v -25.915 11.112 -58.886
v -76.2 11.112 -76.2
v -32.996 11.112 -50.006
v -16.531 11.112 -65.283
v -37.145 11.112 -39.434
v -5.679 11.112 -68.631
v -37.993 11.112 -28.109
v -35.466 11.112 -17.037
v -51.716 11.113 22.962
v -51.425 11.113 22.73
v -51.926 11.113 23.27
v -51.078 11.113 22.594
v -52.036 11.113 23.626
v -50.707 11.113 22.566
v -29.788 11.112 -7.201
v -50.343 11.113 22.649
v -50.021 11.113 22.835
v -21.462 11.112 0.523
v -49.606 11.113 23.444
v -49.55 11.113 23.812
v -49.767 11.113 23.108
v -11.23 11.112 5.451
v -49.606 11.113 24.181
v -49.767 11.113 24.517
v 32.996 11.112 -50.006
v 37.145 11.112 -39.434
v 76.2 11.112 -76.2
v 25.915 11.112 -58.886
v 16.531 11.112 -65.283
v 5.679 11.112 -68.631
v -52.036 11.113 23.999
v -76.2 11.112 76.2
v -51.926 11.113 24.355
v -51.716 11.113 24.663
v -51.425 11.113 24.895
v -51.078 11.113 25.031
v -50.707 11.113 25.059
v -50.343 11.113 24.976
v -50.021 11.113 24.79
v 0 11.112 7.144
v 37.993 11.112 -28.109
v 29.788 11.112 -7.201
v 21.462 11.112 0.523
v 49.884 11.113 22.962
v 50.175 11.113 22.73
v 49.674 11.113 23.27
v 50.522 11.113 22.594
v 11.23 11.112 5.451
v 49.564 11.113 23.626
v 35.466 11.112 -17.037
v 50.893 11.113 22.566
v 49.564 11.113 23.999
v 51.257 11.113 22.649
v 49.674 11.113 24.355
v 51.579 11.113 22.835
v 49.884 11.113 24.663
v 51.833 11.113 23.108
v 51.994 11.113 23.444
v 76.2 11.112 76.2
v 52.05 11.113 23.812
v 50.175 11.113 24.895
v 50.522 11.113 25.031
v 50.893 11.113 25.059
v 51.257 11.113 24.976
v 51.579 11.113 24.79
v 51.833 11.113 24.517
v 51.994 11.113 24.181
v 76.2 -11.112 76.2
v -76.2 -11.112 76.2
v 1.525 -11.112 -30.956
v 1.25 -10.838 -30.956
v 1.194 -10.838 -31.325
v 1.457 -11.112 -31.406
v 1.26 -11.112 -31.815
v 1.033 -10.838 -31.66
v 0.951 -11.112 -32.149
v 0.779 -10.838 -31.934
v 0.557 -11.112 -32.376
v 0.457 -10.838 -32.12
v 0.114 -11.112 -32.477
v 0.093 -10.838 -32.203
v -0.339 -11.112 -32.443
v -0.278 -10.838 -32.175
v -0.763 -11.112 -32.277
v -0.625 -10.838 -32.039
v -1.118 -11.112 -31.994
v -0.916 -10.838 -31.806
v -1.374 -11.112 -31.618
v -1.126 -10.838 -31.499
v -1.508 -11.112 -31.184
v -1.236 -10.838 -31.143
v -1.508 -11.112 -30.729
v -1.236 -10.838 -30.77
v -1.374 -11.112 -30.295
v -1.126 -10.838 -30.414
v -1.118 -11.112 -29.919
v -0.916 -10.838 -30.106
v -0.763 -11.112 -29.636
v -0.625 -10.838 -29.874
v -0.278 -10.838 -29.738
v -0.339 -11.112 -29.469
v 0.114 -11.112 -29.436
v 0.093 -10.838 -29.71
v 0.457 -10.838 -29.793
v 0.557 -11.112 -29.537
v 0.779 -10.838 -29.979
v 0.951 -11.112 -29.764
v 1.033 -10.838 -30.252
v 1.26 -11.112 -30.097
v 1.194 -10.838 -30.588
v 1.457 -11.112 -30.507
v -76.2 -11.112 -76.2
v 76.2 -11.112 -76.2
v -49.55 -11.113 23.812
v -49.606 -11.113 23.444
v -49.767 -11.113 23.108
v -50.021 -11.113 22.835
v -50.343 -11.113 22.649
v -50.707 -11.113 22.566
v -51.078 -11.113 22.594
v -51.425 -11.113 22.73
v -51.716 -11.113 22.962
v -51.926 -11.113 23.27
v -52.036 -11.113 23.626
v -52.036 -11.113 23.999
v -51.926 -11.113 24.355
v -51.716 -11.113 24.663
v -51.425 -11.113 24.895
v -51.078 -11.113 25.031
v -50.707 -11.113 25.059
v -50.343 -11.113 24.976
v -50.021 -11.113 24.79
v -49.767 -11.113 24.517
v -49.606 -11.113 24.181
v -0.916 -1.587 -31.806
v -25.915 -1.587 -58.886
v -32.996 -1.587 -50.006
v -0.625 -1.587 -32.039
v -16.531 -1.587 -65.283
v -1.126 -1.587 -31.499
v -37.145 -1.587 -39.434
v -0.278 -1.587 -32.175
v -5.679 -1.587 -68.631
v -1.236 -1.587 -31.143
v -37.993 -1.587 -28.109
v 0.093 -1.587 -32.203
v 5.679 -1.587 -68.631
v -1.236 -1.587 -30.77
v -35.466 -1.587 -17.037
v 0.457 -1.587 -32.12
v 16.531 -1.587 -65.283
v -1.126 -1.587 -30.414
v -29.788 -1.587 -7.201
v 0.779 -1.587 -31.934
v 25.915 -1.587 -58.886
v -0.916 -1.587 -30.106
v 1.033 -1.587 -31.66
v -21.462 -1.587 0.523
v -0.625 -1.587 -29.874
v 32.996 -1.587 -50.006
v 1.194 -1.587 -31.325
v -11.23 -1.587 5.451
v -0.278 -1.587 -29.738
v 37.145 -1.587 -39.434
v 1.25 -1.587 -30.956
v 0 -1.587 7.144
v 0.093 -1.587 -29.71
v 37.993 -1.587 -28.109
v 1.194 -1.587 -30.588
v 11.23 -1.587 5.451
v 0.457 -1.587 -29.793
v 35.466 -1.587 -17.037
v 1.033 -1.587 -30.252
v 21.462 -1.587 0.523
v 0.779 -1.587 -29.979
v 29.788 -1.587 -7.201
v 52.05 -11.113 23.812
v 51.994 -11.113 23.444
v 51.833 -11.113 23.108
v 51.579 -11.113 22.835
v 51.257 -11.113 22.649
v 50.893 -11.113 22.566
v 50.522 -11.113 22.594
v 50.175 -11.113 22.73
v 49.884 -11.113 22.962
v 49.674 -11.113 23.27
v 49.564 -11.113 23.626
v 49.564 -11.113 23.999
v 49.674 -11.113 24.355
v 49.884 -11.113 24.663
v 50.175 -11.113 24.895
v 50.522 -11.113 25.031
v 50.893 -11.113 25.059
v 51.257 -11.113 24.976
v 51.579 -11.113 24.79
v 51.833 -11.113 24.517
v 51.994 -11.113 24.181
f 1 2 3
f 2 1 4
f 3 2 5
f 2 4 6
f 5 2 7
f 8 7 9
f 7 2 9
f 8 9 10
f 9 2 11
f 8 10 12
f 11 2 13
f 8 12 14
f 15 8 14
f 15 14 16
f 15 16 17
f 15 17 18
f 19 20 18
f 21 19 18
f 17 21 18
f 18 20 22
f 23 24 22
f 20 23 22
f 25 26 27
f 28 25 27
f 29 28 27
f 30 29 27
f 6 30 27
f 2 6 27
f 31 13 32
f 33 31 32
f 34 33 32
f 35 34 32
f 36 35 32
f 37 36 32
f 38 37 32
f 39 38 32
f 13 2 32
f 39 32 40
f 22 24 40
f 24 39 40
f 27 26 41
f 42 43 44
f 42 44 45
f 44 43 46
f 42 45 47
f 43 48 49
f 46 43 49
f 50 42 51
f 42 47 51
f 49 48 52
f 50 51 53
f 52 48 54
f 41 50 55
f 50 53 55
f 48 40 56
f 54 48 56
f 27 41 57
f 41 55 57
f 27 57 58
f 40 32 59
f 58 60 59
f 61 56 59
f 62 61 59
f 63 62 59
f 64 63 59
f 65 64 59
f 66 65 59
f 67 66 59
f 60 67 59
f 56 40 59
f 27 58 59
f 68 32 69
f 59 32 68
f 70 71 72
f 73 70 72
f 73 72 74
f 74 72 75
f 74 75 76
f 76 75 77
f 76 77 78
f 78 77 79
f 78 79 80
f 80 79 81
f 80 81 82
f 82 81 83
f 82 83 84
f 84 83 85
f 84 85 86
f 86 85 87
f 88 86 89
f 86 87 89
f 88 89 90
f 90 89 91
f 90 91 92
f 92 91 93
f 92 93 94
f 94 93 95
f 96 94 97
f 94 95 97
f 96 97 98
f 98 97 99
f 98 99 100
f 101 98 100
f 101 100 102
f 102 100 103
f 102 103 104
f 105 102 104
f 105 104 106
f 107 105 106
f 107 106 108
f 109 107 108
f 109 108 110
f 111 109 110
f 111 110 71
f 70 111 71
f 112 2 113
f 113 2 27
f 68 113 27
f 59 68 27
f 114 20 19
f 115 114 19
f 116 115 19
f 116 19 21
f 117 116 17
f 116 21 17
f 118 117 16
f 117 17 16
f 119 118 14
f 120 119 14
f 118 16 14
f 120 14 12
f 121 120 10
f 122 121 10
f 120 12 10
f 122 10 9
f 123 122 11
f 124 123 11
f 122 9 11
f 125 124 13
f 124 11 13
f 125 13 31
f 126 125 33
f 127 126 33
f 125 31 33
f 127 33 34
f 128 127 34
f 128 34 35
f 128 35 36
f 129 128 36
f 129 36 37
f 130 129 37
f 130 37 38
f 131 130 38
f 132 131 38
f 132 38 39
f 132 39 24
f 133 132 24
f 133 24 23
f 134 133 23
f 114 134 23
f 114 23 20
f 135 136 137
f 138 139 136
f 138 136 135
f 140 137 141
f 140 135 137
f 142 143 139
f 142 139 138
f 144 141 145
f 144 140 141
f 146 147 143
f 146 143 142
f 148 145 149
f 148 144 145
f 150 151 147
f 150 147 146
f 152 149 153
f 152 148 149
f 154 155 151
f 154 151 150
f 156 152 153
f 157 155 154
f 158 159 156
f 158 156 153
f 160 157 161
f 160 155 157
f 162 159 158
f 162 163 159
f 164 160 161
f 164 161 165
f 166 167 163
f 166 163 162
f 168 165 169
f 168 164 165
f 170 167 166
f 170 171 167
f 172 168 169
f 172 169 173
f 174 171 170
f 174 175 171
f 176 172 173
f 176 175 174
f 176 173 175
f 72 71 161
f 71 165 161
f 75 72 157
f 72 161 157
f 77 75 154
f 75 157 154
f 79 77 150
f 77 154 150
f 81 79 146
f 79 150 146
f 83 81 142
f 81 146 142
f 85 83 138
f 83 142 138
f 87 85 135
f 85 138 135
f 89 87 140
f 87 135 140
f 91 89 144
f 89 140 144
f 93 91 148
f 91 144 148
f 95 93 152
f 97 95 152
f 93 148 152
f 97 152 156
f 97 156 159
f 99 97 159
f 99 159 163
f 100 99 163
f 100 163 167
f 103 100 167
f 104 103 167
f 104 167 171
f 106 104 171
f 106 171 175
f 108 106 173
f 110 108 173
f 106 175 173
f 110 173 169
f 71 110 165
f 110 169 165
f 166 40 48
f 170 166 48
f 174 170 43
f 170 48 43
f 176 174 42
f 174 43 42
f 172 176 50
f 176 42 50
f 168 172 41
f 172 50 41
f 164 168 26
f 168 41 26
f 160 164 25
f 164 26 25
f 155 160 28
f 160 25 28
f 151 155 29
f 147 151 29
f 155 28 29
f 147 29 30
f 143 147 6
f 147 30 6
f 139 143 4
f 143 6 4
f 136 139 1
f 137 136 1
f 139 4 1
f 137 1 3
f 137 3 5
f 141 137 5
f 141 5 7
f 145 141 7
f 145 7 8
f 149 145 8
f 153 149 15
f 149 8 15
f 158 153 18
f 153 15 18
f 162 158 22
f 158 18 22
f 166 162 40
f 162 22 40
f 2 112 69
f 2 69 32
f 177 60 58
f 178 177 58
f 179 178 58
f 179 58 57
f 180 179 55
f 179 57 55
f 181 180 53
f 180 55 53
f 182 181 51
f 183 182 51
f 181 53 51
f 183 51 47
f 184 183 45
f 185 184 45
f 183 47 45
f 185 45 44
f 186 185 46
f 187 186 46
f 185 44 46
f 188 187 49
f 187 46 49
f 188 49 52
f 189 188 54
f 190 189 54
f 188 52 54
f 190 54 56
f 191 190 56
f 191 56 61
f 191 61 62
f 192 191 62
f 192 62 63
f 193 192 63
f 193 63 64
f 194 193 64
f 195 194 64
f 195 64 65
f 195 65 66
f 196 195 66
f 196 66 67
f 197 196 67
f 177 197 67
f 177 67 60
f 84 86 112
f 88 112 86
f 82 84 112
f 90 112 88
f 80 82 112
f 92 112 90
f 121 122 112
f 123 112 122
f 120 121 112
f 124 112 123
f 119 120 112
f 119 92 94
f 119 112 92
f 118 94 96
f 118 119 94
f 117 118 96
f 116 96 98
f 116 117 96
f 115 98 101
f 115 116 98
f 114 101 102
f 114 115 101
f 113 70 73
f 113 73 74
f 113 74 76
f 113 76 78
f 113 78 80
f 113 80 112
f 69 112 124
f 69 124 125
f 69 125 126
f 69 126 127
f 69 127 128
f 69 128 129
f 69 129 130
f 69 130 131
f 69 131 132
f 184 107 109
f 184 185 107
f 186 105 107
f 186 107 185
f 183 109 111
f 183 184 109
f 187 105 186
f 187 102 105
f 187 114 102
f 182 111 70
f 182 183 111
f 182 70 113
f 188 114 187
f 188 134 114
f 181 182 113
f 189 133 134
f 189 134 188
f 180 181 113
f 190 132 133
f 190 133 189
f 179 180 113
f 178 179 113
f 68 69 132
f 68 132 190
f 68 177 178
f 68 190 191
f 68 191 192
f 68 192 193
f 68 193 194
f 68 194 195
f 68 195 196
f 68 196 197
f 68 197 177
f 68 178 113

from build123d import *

# Parameters (mm, degrees)
SKETCH3_W                   = 152.4
SKETCH3_H                   = 22.225
BOSS_EXTRUDE1_DEPTH         = 76.2
M3_TAPPED_HOLE1_D           = 2.5
SKETCH10_R                  = 38.1
CUT_EXTRUDE3_DEPTH          = 12.7
M3_TAPPED_HOLE2_D           = 2.5
M3_TAPPED_HOLE2_CSINK_D     = 3.05
M3_TAPPED_HOLE2_CSINK_ANGLE = 90


with BuildPart() as part:
    # Sketch3 → Boss-Extrude1 (new, symmetric)
    with BuildSketch(Plane.XY):
        Rectangle(SKETCH3_W, SKETCH3_H)
    extrude(amount=BOSS_EXTRUDE1_DEPTH, both=True)

    # M3 Tapped Hole1 (through all)
    with Locations(Plane(origin=(0, -11.1125, 0), x_dir=(-1, 0, 0), z_dir=(0, -1, 0))):
        with Locations((-50.8, -23.8125), (50.8, -23.8125)):
            Hole(M3_TAPPED_HOLE1_D / 2)

    # Sketch10 → Cut-Extrude3 (cut)
    with BuildSketch(Plane(origin=(0, 11.1125, 0), x_dir=(1, 0, 0), z_dir=(0, 1, 0))):
        with Locations(Location((0, 30.95625, 0), (0, 0, 270))):
            Circle(SKETCH10_R)
    extrude(amount=-CUT_EXTRUDE3_DEPTH, mode=Mode.SUBTRACT)

    # M3 Tapped Hole2 (through all)
    with Locations(Plane(origin=(0, -11.1125, 0), x_dir=(-1, 0, 0), z_dir=(0, -1, 0))):
        with Locations((0, 30.95625)):
            CounterSinkHole(M3_TAPPED_HOLE2_D / 2, M3_TAPPED_HOLE2_CSINK_D / 2, counter_sink_angle=M3_TAPPED_HOLE2_CSINK_ANGLE)


solid = part.part
